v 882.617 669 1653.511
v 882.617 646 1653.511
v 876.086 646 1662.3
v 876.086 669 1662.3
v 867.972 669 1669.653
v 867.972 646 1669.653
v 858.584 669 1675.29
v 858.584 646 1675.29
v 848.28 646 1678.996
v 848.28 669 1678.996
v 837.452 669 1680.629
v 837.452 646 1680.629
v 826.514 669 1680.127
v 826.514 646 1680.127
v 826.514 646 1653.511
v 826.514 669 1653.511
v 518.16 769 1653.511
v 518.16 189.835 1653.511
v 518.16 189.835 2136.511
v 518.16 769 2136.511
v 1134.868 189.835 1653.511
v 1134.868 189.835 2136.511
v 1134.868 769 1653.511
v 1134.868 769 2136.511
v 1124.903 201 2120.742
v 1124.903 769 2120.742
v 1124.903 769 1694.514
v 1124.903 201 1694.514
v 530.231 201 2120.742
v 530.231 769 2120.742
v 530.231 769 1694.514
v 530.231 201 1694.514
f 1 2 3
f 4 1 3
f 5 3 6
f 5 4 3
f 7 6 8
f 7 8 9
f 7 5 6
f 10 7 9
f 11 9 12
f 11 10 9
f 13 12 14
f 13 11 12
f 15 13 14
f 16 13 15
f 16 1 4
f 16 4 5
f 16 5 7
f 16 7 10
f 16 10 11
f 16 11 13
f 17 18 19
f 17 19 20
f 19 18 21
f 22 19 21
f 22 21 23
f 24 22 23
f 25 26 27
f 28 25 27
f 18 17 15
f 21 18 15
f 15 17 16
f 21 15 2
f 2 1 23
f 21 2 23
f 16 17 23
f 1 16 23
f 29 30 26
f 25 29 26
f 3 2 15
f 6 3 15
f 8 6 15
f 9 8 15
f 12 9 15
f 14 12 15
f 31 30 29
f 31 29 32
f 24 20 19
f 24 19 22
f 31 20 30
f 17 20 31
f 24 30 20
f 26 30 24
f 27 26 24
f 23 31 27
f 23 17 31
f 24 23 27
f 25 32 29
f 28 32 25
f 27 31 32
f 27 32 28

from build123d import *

# Parameters (mm, degrees)
BOSS_EXTRUDE1_START = 710
SKETCH2_W           = 616.707969139
SKETCH2_H           = 579.165034538
BOSS_EXTRUDE1_DEPTH = 483
SKETCH3_W           = 594.672235047
SKETCH3_H           = 426.228299924
CUT_EXTRUDE1_DEPTH  = 568
CUT_EXTRUDE2_START  = -100
CUT_EXTRUDE2_DEPTH  = 23


with BuildPart() as part:
    # Sketch2 → Boss-Extrude1 (new body)
    with BuildSketch(Plane.XY.offset(943.510776168).offset(BOSS_EXTRUDE1_START)):
        with Locations((826.513525673, 479.417482731)):
            Rectangle(SKETCH2_W, SKETCH2_H)
    extrude(amount=BOSS_EXTRUDE1_DEPTH)

    # Sketch3 → Cut-Extrude1 (cut)
    with BuildSketch(Plane(origin=(0, 769, 0), x_dir=(1, 0, 0), z_dir=(0, 1, 0))):
        with Locations((827.567040516, -1907.628066077)):
            Rectangle(SKETCH3_W, SKETCH3_H)
    extrude(amount=-CUT_EXTRUDE1_DEPTH, mode=Mode.SUBTRACT)

    # Sketch4 → Cut-Extrude2 (cut)
    with BuildSketch(Plane(origin=(0, 769, 0), x_dir=(1, 0, 0), z_dir=(0, 1, 0)).offset(CUT_EXTRUDE2_START)):
        with BuildLine():
            Line((826.513525672, -1680.127363582), (826.513525672, -1653.510776168))
            Line((826.513525672, -1653.510776168), (882.617138286, -1653.510776168))
            ThreePointArc((882.617138286, -1653.510776168), (858.584109748, -1675.290026262), (826.513525672, -1680.127363582))
        make_face()
    extrude(amount=-CUT_EXTRUDE2_DEPTH, mode=Mode.SUBTRACT)


solid = part.part
